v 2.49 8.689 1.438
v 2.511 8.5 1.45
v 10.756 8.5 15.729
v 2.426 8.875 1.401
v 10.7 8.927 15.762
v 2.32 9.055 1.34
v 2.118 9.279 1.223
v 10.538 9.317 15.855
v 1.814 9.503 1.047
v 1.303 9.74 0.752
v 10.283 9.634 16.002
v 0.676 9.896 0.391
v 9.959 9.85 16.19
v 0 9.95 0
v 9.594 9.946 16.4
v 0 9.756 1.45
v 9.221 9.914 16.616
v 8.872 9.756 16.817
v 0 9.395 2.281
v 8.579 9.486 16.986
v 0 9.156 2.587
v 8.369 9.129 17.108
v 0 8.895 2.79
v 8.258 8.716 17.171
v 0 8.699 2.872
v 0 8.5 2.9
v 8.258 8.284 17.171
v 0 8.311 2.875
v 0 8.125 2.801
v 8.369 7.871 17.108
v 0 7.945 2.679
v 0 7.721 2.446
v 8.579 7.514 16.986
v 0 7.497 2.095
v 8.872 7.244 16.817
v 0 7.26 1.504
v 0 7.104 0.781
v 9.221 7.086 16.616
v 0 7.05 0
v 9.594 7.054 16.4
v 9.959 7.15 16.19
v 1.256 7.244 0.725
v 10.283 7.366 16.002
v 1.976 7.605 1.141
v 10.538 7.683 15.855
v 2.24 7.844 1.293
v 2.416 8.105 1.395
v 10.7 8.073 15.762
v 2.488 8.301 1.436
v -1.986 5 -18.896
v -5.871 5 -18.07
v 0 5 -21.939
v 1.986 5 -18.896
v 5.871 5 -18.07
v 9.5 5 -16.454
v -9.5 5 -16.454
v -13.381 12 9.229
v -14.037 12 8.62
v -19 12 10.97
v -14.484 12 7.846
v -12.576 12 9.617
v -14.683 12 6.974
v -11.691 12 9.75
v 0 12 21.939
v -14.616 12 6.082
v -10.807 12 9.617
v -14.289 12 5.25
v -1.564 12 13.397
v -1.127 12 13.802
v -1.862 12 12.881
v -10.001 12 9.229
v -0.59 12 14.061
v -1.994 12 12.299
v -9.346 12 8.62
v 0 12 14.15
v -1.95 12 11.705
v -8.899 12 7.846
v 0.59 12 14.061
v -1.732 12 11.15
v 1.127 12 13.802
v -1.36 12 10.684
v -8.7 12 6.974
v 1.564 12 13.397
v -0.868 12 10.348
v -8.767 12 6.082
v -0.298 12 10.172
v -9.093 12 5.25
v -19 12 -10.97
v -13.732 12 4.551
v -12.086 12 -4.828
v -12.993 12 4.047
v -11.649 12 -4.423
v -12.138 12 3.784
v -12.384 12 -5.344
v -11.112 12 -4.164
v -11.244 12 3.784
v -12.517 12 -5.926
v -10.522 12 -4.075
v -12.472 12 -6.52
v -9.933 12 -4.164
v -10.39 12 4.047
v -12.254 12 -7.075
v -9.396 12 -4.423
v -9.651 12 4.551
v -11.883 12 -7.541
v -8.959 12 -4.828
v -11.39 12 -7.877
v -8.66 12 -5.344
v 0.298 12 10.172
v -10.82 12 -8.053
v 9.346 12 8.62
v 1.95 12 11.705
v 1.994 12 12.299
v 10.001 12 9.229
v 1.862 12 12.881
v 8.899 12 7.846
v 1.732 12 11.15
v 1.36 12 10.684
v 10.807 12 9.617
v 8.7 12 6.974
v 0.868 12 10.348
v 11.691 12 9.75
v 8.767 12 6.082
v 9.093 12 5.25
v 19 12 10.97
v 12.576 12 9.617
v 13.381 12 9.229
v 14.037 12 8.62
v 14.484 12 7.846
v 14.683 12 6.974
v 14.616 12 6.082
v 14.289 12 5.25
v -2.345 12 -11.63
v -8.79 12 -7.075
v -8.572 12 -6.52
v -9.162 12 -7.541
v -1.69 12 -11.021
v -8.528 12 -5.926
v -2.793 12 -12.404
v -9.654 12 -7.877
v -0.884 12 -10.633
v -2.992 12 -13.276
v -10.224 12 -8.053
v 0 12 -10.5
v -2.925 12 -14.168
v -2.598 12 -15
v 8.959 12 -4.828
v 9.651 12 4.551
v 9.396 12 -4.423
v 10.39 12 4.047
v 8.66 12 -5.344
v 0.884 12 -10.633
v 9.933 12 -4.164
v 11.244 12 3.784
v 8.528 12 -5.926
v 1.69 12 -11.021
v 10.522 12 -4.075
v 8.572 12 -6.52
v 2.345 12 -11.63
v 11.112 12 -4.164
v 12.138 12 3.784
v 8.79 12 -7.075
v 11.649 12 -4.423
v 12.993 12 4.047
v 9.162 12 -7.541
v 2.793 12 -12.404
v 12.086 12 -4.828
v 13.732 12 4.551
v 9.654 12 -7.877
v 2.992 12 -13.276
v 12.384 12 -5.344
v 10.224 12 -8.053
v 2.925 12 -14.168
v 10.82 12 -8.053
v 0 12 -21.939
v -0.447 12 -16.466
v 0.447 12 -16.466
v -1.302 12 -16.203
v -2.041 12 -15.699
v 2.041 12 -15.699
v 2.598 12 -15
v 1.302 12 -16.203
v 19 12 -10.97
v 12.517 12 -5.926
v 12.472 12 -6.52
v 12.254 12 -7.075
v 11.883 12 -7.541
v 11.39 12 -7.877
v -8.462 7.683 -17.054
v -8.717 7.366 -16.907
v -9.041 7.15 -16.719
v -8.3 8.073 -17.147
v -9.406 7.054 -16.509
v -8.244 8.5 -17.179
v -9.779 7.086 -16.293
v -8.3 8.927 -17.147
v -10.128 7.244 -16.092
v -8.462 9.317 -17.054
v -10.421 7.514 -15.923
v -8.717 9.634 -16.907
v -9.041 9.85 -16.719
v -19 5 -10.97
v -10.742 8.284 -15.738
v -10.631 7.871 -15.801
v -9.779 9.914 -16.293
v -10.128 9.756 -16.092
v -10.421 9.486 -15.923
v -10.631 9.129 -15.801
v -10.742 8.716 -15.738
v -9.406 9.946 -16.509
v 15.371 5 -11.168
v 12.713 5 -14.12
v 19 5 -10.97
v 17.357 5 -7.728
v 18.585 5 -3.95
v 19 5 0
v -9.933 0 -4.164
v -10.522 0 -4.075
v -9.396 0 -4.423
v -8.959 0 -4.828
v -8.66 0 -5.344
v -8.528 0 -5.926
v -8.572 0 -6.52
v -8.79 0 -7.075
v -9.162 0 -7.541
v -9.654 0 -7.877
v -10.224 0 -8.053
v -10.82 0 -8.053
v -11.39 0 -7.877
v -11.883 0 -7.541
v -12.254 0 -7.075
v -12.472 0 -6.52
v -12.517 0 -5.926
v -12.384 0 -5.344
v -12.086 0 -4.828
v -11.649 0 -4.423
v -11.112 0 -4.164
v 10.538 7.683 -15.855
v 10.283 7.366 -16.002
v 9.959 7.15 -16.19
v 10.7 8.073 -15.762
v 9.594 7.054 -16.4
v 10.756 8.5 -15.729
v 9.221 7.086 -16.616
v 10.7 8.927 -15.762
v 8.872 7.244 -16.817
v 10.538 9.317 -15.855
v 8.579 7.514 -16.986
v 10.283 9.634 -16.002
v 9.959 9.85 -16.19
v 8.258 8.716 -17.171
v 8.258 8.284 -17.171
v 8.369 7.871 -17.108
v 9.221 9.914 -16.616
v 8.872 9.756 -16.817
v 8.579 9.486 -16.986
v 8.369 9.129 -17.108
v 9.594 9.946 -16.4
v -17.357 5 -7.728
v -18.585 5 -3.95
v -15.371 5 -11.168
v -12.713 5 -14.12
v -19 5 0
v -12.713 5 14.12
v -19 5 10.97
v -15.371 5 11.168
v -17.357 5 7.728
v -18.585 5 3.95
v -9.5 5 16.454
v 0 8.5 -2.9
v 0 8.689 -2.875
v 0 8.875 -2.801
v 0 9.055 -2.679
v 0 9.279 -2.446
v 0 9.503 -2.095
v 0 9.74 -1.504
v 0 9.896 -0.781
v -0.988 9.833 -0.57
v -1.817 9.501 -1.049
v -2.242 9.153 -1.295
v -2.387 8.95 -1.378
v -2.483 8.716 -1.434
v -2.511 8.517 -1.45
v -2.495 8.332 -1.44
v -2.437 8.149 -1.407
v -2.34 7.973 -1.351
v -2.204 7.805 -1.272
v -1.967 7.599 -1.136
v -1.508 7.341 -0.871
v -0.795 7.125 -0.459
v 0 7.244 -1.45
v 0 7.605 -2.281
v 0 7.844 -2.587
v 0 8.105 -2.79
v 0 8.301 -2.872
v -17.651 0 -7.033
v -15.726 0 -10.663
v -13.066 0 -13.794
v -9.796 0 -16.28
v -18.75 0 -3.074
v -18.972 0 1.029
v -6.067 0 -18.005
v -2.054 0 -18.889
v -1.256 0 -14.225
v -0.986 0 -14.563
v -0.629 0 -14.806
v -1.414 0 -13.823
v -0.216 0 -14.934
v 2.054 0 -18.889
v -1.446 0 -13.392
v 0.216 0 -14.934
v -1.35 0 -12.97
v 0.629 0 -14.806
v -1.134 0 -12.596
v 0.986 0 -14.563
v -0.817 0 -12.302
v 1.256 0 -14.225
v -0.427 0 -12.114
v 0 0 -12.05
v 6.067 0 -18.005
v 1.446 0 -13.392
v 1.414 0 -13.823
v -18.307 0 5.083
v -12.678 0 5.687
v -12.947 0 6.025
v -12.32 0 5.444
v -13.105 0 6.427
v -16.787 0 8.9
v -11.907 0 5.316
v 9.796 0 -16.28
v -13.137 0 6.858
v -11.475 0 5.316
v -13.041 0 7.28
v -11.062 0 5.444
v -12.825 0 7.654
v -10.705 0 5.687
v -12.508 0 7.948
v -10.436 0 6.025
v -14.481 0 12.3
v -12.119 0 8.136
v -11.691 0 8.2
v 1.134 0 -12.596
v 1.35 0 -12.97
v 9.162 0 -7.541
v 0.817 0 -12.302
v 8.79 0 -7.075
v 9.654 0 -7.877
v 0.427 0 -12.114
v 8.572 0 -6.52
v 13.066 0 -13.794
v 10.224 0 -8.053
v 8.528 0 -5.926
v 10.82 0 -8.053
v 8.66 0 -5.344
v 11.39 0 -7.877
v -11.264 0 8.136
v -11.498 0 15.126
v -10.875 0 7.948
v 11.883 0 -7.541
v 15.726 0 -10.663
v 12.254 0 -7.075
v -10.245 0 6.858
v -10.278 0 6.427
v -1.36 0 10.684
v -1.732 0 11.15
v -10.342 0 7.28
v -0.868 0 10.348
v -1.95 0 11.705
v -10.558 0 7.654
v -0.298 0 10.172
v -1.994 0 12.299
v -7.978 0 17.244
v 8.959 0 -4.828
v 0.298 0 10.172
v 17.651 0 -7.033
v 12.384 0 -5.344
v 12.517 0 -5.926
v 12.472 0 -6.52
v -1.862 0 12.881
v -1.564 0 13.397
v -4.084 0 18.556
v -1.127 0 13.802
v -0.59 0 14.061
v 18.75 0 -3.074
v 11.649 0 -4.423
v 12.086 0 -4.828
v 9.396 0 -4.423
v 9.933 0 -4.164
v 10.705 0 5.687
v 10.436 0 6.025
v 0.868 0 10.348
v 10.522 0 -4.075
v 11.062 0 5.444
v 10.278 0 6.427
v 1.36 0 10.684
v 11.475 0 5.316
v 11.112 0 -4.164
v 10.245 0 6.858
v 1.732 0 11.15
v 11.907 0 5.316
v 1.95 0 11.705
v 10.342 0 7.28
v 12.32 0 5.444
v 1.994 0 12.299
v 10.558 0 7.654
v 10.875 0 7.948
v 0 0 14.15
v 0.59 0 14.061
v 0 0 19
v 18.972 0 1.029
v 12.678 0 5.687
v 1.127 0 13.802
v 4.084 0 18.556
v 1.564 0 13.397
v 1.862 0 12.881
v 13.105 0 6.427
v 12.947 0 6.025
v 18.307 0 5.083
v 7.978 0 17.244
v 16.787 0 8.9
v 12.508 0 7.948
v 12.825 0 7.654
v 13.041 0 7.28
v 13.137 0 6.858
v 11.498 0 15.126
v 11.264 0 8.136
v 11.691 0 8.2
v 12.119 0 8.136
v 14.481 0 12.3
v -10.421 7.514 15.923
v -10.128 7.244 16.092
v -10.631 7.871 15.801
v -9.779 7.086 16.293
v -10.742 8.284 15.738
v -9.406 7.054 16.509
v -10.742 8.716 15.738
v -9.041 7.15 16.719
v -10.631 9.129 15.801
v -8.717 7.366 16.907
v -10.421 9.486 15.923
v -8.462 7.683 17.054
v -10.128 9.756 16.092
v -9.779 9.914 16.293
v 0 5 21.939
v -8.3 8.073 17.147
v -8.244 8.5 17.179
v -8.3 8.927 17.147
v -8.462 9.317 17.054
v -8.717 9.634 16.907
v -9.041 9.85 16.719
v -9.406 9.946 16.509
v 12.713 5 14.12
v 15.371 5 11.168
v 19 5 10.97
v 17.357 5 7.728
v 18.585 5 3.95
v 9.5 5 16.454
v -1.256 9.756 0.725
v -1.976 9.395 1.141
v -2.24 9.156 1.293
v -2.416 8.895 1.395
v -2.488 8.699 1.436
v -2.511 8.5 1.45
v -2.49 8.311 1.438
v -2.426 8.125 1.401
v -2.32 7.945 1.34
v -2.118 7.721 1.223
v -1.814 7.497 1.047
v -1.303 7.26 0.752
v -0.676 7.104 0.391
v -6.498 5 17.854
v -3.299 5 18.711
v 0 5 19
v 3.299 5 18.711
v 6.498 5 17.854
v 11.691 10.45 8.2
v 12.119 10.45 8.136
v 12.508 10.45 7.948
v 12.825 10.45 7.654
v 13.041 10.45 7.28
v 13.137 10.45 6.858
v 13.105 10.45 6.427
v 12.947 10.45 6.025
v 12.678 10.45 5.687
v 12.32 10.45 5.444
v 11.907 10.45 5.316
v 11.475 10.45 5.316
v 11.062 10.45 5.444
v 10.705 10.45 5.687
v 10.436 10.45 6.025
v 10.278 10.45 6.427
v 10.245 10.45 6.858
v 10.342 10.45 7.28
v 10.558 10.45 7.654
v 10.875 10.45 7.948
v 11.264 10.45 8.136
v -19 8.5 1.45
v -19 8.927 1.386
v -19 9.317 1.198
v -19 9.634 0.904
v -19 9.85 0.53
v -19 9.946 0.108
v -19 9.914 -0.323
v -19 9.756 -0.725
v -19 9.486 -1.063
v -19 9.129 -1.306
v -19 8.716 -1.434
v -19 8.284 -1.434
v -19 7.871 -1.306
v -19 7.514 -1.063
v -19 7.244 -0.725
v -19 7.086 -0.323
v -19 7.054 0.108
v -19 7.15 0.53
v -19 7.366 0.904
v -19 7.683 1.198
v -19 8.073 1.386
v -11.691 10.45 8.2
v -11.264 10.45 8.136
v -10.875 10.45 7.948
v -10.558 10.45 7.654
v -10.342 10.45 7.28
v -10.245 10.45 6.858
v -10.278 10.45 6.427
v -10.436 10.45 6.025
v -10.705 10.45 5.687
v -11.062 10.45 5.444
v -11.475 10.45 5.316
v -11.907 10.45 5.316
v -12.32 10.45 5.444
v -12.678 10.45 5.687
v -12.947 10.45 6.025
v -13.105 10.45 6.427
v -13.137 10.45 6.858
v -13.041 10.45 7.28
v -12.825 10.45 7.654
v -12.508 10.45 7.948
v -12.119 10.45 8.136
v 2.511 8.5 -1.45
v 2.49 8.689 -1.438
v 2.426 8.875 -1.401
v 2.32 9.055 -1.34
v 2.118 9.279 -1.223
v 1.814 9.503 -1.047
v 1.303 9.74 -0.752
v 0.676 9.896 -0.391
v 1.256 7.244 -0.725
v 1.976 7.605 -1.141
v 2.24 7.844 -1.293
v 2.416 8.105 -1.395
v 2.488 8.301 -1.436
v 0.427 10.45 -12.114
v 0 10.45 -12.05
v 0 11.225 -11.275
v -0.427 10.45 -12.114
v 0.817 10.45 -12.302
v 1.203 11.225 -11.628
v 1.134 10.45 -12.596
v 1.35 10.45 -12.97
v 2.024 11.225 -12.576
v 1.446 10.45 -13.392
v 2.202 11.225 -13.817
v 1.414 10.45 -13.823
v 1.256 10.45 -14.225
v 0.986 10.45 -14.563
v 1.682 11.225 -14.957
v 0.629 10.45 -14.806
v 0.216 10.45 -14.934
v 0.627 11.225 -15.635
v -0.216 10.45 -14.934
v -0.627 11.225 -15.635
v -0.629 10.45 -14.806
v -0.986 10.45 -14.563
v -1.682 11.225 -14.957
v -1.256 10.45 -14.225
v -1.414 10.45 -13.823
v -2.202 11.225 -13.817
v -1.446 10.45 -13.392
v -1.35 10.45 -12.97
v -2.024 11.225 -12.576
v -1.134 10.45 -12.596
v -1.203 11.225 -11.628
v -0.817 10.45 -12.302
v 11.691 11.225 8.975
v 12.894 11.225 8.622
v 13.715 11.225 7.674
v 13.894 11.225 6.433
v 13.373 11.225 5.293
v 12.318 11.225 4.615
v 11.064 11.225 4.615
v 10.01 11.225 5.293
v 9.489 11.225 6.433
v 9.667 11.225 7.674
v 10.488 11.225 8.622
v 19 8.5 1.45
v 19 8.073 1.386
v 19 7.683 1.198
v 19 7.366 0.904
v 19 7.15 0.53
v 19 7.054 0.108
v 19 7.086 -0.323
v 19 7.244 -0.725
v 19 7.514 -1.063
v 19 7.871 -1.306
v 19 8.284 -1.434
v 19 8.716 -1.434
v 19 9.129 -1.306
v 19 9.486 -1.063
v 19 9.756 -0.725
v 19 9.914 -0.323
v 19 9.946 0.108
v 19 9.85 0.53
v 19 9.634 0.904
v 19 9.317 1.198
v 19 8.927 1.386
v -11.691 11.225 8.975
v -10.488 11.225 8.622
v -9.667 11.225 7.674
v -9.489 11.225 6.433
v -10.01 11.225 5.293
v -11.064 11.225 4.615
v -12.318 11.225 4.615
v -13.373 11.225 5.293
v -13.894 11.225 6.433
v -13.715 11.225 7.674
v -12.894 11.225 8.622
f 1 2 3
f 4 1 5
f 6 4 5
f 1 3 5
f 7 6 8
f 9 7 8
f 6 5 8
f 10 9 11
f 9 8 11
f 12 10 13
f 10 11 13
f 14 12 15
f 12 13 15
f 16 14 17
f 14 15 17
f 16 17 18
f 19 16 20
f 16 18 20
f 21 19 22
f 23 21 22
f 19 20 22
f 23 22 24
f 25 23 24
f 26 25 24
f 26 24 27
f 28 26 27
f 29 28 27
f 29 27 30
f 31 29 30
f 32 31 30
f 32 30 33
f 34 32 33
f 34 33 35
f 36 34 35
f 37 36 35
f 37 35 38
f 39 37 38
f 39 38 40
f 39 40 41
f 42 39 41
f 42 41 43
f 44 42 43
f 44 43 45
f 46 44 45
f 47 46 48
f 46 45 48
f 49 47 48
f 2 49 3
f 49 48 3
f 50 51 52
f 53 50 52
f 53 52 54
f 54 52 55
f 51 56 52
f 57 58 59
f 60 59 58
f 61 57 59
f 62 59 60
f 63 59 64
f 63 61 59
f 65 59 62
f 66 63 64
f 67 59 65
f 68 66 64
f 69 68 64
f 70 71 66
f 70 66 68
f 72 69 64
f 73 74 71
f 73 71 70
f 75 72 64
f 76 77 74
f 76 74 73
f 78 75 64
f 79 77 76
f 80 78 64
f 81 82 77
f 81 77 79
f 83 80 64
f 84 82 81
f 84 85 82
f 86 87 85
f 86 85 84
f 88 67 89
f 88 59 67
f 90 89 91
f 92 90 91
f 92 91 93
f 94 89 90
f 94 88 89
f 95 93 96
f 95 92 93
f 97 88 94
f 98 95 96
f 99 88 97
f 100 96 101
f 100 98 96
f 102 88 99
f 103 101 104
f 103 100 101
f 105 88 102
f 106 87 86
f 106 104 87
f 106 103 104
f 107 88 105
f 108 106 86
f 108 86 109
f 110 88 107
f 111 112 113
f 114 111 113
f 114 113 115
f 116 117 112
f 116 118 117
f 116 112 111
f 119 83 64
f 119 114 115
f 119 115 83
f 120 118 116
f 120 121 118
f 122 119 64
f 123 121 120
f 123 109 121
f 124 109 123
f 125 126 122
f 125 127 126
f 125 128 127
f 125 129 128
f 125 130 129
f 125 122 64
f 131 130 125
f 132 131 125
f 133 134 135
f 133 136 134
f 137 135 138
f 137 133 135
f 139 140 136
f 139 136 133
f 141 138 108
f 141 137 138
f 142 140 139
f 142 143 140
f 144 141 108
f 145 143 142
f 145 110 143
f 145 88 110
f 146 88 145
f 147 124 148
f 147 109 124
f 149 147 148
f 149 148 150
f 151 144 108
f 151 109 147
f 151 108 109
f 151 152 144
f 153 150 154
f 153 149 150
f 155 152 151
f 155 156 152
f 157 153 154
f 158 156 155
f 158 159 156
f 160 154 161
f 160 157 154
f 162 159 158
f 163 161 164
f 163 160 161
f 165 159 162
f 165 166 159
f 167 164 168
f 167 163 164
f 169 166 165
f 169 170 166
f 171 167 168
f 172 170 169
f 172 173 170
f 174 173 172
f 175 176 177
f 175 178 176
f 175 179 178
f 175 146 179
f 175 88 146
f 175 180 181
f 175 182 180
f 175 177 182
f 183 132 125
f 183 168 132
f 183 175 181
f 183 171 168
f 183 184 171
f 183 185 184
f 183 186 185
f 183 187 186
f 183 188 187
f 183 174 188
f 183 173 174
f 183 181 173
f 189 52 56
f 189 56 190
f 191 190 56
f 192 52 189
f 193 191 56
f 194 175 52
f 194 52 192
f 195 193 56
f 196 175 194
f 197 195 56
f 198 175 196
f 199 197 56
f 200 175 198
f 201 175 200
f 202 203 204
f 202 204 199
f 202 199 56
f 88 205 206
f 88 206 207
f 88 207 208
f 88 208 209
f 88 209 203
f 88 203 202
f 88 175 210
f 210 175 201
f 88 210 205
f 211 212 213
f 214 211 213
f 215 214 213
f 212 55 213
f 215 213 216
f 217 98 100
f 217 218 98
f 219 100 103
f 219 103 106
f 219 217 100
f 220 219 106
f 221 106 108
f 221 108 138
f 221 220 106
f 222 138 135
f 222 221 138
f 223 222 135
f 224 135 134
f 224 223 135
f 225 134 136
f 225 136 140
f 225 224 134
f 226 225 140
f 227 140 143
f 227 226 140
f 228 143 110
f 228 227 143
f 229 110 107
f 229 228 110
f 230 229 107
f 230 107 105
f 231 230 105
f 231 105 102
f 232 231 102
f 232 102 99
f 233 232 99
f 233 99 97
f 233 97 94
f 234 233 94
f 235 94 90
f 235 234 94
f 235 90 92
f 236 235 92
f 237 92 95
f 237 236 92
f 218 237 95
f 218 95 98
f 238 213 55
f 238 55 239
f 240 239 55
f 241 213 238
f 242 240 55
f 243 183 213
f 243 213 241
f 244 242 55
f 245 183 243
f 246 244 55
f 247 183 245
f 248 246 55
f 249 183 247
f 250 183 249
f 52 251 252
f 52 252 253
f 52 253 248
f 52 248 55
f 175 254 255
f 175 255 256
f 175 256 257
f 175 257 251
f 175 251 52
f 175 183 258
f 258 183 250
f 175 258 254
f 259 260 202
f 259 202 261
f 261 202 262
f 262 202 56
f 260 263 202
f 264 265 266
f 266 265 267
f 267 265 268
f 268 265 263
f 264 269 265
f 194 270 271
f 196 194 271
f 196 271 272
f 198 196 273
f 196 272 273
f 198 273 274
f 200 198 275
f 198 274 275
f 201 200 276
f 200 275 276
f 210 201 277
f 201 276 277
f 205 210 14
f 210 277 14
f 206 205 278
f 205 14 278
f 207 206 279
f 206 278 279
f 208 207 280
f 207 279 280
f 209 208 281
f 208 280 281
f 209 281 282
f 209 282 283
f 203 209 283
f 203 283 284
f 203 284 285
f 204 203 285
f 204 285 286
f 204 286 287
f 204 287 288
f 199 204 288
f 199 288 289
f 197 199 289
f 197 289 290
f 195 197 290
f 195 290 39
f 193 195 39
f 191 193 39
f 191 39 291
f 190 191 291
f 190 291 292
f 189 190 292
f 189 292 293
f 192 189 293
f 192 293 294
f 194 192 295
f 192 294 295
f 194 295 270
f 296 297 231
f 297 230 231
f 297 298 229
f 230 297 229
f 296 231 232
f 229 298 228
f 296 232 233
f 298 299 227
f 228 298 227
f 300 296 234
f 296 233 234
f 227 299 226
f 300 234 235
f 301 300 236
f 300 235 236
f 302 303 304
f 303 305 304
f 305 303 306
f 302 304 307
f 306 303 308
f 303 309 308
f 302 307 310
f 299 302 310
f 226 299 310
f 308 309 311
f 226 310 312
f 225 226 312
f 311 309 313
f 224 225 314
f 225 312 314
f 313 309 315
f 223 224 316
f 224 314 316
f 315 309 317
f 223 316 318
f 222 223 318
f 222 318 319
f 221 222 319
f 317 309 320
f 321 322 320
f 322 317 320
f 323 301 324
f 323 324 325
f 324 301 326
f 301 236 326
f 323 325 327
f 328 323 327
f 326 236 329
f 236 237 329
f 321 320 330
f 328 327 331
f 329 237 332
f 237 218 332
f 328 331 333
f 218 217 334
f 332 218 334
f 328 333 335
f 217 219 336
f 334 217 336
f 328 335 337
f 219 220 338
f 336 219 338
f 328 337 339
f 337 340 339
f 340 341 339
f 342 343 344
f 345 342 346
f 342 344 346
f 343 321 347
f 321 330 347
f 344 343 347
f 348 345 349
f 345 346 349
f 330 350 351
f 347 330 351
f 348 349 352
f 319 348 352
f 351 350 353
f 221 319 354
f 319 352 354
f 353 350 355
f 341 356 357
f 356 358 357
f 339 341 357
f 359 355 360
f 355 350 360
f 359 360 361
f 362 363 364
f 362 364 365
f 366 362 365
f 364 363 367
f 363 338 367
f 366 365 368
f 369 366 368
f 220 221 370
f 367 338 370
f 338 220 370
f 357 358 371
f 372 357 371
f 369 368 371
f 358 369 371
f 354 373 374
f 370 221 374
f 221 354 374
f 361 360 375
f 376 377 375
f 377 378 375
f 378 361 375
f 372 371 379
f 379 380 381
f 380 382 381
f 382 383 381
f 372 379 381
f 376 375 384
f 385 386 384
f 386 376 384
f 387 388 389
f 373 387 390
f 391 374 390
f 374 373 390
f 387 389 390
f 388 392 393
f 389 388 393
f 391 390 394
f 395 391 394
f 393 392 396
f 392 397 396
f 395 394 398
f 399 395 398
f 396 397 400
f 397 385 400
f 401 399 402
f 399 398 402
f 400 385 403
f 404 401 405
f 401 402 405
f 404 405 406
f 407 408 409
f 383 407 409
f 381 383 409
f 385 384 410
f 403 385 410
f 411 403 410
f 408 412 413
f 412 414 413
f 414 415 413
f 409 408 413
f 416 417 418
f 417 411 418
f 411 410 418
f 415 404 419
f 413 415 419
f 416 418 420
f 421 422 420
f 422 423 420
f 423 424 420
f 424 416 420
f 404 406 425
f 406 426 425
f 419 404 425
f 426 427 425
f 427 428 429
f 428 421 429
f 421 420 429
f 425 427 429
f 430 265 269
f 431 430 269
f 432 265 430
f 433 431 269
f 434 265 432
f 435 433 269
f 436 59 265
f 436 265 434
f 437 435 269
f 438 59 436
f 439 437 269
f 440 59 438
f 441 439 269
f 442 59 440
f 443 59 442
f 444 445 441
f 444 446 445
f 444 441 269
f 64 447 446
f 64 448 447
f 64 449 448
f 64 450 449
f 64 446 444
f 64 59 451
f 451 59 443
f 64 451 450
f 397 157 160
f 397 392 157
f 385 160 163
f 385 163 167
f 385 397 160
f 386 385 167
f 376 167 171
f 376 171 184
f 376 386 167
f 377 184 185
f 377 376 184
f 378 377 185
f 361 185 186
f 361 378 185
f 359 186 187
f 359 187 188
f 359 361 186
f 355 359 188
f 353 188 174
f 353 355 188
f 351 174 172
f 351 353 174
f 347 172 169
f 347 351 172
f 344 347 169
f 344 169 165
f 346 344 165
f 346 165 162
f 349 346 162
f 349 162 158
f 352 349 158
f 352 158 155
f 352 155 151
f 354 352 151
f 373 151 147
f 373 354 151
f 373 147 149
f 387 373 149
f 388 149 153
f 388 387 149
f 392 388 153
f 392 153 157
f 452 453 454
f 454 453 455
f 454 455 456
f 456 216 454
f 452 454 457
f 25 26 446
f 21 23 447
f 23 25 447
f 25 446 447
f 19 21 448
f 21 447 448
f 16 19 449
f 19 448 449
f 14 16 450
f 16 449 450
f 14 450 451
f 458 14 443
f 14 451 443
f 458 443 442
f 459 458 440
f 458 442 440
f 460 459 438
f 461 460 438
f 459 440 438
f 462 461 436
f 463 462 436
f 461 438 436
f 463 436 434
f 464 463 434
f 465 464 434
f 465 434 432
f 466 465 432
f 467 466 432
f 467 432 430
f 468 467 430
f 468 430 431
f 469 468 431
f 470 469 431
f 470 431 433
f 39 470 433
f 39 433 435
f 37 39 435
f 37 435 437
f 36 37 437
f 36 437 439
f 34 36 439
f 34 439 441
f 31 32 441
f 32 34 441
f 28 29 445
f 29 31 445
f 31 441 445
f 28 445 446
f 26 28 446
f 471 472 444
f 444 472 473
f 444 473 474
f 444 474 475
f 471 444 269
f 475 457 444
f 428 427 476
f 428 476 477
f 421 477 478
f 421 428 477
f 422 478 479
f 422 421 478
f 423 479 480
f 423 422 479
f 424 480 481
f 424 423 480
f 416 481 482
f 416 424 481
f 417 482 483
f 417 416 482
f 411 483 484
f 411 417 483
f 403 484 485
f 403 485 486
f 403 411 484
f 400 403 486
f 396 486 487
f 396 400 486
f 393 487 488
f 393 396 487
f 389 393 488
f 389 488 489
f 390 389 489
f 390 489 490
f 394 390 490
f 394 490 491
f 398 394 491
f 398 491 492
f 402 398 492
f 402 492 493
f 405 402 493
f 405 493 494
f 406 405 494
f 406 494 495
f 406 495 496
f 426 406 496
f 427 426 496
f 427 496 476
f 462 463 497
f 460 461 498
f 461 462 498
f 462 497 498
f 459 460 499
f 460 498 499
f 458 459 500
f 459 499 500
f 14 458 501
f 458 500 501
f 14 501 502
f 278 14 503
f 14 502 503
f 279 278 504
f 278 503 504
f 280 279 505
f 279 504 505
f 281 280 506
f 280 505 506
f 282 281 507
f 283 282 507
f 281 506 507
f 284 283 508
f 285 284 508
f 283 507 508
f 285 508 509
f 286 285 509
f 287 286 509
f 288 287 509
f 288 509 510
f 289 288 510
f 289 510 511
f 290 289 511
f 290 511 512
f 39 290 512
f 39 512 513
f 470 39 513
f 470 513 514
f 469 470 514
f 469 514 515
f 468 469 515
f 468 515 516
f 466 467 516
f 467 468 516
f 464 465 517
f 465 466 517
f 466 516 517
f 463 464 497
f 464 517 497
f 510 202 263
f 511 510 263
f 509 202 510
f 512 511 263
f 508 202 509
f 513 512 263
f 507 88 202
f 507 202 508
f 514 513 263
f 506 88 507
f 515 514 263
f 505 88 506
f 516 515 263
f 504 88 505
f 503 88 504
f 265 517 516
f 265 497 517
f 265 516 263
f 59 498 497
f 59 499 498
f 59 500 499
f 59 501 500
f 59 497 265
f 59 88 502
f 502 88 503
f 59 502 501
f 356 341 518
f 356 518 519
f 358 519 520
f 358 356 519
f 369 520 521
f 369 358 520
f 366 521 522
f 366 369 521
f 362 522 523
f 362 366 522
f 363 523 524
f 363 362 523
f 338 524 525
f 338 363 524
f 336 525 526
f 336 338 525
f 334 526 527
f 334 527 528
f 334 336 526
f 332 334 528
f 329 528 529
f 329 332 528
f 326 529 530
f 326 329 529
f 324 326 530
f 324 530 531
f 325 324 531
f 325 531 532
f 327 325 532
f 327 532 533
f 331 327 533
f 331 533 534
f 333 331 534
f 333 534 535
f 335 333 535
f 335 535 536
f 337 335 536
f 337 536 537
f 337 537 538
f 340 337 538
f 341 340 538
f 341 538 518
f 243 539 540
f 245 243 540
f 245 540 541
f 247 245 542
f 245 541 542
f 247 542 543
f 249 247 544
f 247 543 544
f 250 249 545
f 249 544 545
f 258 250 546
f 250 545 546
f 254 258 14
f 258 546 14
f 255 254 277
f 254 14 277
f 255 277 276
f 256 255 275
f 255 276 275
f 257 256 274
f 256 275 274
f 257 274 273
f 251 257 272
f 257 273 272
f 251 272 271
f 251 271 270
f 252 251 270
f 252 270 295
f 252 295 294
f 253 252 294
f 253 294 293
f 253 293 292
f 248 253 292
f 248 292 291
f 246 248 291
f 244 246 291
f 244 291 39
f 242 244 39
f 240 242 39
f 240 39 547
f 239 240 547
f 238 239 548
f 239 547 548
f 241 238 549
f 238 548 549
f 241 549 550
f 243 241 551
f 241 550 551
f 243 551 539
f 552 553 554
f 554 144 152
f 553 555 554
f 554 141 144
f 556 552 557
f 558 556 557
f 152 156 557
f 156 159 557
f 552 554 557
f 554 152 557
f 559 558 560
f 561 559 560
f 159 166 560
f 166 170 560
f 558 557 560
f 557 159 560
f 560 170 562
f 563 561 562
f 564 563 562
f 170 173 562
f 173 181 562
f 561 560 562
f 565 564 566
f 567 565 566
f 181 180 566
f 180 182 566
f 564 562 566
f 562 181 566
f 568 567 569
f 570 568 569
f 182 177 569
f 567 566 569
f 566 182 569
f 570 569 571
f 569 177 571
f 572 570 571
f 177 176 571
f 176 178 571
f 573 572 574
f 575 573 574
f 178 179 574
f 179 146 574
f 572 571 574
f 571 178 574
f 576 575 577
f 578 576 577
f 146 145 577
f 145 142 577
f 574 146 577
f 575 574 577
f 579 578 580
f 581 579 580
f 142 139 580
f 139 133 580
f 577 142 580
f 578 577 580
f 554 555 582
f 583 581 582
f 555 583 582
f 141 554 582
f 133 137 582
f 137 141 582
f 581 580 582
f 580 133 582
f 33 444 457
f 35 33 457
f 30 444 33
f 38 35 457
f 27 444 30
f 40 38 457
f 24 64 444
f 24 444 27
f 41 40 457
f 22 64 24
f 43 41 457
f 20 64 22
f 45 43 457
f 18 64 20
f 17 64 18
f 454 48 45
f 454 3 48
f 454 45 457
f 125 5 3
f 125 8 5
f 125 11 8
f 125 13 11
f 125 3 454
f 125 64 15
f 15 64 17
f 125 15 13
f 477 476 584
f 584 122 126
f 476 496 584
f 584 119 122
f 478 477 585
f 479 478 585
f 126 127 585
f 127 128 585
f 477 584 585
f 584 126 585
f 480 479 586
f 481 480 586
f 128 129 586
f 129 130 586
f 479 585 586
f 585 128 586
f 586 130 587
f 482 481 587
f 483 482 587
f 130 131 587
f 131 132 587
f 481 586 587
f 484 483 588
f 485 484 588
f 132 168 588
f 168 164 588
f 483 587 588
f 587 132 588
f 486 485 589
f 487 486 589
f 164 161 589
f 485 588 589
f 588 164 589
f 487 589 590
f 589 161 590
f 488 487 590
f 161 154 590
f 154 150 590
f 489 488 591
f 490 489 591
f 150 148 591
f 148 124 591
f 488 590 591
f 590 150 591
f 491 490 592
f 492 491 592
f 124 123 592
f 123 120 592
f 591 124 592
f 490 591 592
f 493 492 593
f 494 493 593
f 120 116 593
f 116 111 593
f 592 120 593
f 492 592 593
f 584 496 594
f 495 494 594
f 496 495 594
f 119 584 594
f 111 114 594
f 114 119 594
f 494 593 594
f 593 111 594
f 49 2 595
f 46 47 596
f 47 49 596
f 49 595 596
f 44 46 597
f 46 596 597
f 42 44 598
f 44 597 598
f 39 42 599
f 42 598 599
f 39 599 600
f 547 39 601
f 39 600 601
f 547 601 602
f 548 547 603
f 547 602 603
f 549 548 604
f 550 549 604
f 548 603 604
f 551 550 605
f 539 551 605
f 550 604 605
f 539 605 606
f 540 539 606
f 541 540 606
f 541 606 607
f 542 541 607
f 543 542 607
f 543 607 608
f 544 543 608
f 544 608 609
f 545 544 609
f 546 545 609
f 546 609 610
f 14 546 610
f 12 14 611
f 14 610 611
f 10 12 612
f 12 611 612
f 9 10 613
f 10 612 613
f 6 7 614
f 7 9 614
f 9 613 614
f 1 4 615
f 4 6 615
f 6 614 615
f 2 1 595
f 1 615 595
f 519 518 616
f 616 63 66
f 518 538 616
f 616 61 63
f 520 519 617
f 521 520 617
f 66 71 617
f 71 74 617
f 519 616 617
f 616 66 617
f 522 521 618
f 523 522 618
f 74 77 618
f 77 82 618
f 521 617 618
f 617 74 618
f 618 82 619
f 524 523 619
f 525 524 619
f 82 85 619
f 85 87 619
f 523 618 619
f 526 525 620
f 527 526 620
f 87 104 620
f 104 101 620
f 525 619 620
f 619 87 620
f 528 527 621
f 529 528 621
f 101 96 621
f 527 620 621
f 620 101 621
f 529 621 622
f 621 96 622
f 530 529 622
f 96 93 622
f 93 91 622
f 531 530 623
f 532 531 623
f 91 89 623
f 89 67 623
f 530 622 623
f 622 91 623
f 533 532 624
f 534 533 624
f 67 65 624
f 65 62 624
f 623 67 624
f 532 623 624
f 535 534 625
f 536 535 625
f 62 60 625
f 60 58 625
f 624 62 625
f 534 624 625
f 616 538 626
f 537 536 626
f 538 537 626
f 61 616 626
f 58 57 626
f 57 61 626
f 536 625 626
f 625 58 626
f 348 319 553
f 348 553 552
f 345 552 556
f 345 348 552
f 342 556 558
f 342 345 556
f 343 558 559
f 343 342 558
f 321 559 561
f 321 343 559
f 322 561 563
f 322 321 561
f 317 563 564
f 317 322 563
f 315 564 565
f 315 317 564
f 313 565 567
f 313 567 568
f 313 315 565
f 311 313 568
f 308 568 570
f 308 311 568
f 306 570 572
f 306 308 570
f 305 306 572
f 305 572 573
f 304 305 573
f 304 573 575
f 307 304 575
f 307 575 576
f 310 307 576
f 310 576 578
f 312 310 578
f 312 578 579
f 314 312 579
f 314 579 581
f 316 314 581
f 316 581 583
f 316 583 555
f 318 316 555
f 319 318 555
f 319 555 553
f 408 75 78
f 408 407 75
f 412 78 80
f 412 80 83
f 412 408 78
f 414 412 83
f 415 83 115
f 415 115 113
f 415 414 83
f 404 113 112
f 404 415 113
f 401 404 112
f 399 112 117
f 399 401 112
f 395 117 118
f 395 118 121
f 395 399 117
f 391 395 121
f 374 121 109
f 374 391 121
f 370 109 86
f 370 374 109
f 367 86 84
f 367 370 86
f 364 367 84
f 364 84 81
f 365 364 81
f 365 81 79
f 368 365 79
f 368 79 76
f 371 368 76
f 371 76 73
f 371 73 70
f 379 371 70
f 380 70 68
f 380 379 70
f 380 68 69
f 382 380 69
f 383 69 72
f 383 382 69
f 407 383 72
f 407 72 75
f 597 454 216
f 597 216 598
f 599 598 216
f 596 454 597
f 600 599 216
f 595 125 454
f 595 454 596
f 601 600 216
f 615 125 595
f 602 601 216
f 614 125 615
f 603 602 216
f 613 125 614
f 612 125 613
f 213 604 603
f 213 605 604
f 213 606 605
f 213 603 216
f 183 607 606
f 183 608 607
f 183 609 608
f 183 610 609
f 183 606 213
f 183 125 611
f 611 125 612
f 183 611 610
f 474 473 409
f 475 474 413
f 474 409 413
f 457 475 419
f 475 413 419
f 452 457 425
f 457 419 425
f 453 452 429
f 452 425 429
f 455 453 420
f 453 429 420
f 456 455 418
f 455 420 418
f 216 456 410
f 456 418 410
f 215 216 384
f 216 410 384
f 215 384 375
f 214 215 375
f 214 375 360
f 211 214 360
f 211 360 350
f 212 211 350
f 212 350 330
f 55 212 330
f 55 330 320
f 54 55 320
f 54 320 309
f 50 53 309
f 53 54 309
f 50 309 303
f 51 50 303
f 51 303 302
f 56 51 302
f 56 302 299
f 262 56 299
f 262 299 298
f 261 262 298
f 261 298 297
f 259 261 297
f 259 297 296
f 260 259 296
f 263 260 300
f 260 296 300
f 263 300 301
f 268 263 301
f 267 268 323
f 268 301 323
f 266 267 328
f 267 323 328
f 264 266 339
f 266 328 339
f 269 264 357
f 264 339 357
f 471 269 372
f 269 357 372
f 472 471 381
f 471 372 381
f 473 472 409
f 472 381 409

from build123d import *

# Parameters (mm, degrees)
SKETCH_1_R          = 19
SKETCH_1_R_2        = 1.45
SKETCH_1_R_3        = 2
EXTRUDE_1_DEPTH     = 12
SKETCH_2_R          = 1.45
SKETCH_2_R_2        = 2
EXTRUDE_2_DEPTH     = 7
SKETCH_3_R          = 1.45
CUT_EXTRUDE_1_DEPTH = 50.298411063
SKETCH_4_R          = 1.45
CUT_EXTRUDE_2_DEPTH = 50.298411063
SKETCH_5_R          = 1.45
CUT_EXTRUDE_3_DEPTH = 8
SKETCH_6_R          = 1.45
CUT_EXTRUDE_4_DEPTH = 46.489925625
CHAMFER_1_SIZE      = 1.55


with BuildPart() as part:
    # 草图1 → 凸台-拉伸1 (new body)
    with BuildSketch(Plane(origin=(0, 0, 0), x_dir=(1, 0, 0), z_dir=(0, 1, 0))):
        with Locations(Location((0, 0, 0), (0, 0, 270))):
            Circle(SKETCH_1_R)
        with Locations(Location((0, 13.5, 0), (0, 0, 270))):
            Circle(SKETCH_1_R_2, mode=Mode.SUBTRACT)
        with Locations(Location((-11.691342951, -6.75, 0), (0, 0, 270))):
            Circle(SKETCH_1_R_2, mode=Mode.SUBTRACT)
        with Locations(Location((11.691342951, -6.75, 0), (0, 0, 270))):
            Circle(SKETCH_1_R_2, mode=Mode.SUBTRACT)
        with Locations(Location((-10.522208656, 6.075, 0), (0, 0, 270))):
            Circle(SKETCH_1_R_3, mode=Mode.SUBTRACT)
        with Locations(Location((0, -12.15, 0), (0, 0, 270))):
            Circle(SKETCH_1_R_3, mode=Mode.SUBTRACT)
        with Locations(Location((10.522208656, 6.075, 0), (0, 0, 270))):
            Circle(SKETCH_1_R_3, mode=Mode.SUBTRACT)
    extrude(amount=EXTRUDE_1_DEPTH)

    # 草图2 → 凸台-拉伸2 (add)
    with BuildSketch(Plane(origin=(0, 12, 0), x_dir=(1, 0, 0), z_dir=(0, 1, 0))):
        Polygon((0, 21.939310229), (-19, 10.969655115), (-19, -10.969655115), (0, -21.939310229), (19, -10.969655115), (19, 10.969655115), align=None)
        with Locations(Location((0, 13.5, 0), (0, 0, 270))):
            Circle(SKETCH_2_R, mode=Mode.SUBTRACT)
        with Locations(Location((-10.522208656, 6.075, 0), (0, 0, 270))):
            Circle(SKETCH_2_R_2, mode=Mode.SUBTRACT)
        with Locations(Location((10.522208656, 6.075, 0), (0, 0, 270))):
            Circle(SKETCH_2_R_2, mode=Mode.SUBTRACT)
        with Locations(Location((-11.691342951, -6.75, 0), (0, 0, 270))):
            Circle(SKETCH_2_R, mode=Mode.SUBTRACT)
        with Locations(Location((0, -12.15, 0), (0, 0, 270))):
            Circle(SKETCH_2_R_2, mode=Mode.SUBTRACT)
        with Locations(Location((11.691342951, -6.75, 0), (0, 0, 270))):
            Circle(SKETCH_2_R, mode=Mode.SUBTRACT)
    extrude(amount=-EXTRUDE_2_DEPTH)

    # 草图3 → 切除-拉伸1 (cut, through all)
    with BuildSketch(Plane(origin=(9.5, 0, 16.454482672), x_dir=(0.8660254037844384, 0, -0.5000000000000004), z_dir=(0.5000000000000004, 0, 0.8660254037844384))):
        with Locations((0, 8.5)):
            Circle(SKETCH_3_R)
    extrude(amount=-CUT_EXTRUDE_1_DEPTH, mode=Mode.SUBTRACT)

    # 草图4 → 切除-拉伸2 (cut, through all)
    with BuildSketch(Plane(origin=(-9.5, 0, 16.454482672), x_dir=(0.8660254037844385, 0, 0.5000000000000004), z_dir=(-0.5000000000000003, 0, 0.8660254037844384))):
        with Locations((0, 8.5)):
            Circle(SKETCH_4_R)
    extrude(amount=-CUT_EXTRUDE_2_DEPTH, mode=Mode.SUBTRACT)

    # 草图5 → 切除-拉伸3 (cut)
    with BuildSketch(Plane.ZY.offset(19)):
        with Locations((0, 8.5)):
            Circle(SKETCH_5_R)
    extrude(amount=-CUT_EXTRUDE_3_DEPTH, mode=Mode.SUBTRACT)

    # 草图6 → 切除-拉伸4 (cut, through all)
    with BuildSketch(Plane(origin=(19, 0, 0), x_dir=(0, 0, -1), z_dir=(1, 0, 0))):
        with Locations(Location((0, 8.5, 0), (0, 0, 180))):
            Circle(SKETCH_6_R)
    extrude(amount=-CUT_EXTRUDE_4_DEPTH, mode=Mode.SUBTRACT)

    # 倒角1
    chamfer_1_edges = [part.edges().sort_by_distance(p)[0] for p in [
        (11.691342951, 12, 5.3),
        (0, 12, -14.95),
        (-11.691342951, 12, 5.3),
    ]]
    chamfer(chamfer_1_edges, length=CHAMFER_1_SIZE)


solid = part.part
